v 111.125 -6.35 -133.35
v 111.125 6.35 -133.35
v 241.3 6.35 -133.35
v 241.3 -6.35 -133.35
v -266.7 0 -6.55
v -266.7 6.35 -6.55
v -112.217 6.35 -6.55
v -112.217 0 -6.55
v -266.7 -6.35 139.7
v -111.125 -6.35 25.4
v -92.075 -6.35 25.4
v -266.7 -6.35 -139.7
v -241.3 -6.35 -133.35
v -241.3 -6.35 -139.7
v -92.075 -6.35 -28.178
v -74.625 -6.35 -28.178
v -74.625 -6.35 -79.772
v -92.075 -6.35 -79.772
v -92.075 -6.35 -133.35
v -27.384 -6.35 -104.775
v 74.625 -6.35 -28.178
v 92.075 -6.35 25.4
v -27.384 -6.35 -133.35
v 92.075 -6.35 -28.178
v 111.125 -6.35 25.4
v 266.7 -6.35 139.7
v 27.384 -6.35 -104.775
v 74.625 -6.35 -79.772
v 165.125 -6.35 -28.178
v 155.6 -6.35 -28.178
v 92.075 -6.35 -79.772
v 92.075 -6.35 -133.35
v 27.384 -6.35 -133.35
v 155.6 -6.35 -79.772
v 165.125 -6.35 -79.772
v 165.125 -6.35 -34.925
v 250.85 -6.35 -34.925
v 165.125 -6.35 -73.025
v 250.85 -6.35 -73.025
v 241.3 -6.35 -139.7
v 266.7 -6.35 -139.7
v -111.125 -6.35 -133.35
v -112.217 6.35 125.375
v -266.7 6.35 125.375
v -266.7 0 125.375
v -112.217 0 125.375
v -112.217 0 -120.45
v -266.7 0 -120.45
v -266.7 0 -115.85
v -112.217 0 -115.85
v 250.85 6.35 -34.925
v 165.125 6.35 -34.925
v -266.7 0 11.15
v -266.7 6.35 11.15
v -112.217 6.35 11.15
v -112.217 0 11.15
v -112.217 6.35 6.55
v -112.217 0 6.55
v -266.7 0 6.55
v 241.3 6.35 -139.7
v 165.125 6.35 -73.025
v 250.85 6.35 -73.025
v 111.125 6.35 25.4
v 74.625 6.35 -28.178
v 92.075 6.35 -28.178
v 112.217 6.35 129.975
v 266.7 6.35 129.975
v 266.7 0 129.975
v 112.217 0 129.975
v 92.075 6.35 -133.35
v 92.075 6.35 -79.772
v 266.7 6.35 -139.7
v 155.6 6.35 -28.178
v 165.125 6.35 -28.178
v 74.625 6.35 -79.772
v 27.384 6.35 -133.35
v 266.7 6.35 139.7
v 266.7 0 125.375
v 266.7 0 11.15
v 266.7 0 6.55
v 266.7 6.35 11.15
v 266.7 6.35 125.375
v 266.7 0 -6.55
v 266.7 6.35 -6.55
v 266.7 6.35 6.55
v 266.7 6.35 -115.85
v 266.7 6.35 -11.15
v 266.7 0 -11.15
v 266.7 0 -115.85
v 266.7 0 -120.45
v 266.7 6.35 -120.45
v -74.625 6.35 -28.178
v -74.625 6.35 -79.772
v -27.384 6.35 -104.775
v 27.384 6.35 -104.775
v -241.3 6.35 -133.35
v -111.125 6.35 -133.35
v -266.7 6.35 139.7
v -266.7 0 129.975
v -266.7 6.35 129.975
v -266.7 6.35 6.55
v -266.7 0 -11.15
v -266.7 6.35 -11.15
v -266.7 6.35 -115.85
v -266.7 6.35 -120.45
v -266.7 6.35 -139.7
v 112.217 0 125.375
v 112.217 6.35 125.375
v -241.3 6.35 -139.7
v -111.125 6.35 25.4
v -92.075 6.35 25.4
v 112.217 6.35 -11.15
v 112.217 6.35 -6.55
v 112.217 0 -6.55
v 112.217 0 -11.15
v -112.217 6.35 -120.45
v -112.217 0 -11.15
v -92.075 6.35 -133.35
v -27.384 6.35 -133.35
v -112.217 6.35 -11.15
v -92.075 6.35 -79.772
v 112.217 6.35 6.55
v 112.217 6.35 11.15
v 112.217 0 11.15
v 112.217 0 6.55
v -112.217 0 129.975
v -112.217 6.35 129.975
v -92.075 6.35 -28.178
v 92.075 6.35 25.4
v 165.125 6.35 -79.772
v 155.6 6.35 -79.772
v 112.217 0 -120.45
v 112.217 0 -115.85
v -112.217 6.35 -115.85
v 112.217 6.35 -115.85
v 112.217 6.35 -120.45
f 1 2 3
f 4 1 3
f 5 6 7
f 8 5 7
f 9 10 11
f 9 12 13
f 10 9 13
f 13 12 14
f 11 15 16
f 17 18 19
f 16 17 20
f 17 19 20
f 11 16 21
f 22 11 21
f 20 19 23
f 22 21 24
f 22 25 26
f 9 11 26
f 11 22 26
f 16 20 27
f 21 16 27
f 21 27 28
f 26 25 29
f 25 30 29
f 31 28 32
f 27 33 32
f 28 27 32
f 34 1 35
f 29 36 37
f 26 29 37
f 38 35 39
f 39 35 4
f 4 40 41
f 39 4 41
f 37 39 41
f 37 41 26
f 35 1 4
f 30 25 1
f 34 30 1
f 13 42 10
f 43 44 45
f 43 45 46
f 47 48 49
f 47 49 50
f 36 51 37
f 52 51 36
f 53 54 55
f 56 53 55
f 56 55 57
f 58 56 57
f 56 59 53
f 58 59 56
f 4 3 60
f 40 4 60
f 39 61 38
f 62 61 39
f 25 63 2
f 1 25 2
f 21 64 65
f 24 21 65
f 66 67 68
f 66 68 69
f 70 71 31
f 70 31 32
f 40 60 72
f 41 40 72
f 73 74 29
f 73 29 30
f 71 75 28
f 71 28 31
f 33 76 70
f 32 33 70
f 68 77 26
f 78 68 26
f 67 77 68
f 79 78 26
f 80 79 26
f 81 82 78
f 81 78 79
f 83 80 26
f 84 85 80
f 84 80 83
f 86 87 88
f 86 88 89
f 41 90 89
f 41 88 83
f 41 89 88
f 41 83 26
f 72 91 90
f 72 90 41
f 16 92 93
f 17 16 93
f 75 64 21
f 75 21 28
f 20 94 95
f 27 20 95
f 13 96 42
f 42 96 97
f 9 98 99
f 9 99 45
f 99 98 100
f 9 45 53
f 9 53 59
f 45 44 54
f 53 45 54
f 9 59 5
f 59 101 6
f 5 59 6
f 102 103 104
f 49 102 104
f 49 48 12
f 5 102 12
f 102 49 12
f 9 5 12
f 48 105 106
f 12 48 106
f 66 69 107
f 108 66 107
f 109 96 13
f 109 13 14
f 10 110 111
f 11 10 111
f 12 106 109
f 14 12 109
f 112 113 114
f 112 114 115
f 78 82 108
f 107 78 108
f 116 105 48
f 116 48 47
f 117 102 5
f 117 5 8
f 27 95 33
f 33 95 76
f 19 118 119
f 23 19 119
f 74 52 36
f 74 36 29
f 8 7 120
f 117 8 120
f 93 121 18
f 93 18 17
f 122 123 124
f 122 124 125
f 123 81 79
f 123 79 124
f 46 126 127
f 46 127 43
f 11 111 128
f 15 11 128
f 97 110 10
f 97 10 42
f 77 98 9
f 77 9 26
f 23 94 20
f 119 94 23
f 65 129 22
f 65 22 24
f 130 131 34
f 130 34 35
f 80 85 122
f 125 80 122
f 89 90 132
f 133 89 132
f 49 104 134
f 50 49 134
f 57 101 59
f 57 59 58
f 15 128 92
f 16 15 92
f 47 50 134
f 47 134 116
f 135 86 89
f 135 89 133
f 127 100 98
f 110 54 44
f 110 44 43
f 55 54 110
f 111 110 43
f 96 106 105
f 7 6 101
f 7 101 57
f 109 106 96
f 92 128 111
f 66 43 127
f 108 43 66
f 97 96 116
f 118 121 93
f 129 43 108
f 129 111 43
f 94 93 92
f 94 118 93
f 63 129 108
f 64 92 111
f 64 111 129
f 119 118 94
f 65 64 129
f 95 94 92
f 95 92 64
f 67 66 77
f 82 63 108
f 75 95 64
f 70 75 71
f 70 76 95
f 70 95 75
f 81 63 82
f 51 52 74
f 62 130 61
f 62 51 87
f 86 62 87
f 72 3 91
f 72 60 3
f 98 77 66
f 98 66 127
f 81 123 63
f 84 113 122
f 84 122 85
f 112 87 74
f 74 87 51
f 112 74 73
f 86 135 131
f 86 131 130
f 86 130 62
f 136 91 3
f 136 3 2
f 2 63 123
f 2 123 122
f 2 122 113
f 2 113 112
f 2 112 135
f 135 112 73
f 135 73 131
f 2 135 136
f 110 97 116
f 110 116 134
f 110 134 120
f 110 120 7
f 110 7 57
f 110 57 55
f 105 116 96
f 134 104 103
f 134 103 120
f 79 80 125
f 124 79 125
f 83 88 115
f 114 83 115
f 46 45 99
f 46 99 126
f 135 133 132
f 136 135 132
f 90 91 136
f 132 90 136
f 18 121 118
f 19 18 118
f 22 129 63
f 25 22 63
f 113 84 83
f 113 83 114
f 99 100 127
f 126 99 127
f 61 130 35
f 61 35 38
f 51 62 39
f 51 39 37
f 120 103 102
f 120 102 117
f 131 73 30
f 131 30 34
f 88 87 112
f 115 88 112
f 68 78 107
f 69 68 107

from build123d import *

# Parameters (mm, degrees)
SKETCH1_W           = 533.4
SKETCH1_H           = 279.4
BOSS_EXTRUDE1_DEPTH = 6.35
SKETCH2_W           = 482.6
SKETCH2_H           = 6.35
CUT_EXTRUDE1_DEPTH  = 302.34078715
SKETCH3_W           = 19.05
SKETCH3_H           = 158.75
CUT_EXTRUDE2_DEPTH  = 302.34078715
SKETCH4_W           = 17.4498
SKETCH4_H           = 51.59375
CUT_EXTRUDE3_DEPTH  = 302.34078715
SKETCH5_W           = 54.76875
SKETCH5_H           = 28.575
CUT_EXTRUDE4_DEPTH  = 302.34078715
SKETCH6_W           = 154.4828
SKETCH6_H           = 4.6
CUT_EXTRUDE5_DEPTH  = 6.35


with BuildPart() as part:
    # Sketch1 → Boss-Extrude1 (new, symmetric)
    with BuildSketch(Plane(origin=(0, 0, 0), x_dir=(1, 0, 0), z_dir=(0, 1, 0))):
        Rectangle(SKETCH1_W, SKETCH1_H)
    extrude(amount=BOSS_EXTRUDE1_DEPTH, both=True)

    # Sketch2 → Cut-Extrude1 (cut, through all)
    with BuildSketch(Plane(origin=(0, 6.35, 0), x_dir=(1, 0, 0), z_dir=(0, 1, 0))):
        with Locations((0, 136.525)):
            Rectangle(SKETCH2_W, SKETCH2_H)
    extrude(amount=-CUT_EXTRUDE1_DEPTH, mode=Mode.SUBTRACT)

    # Sketch3 → Cut-Extrude2 (cut, through all)
    with BuildSketch(Plane(origin=(0, 6.35, 0), x_dir=(1, 0, 0), z_dir=(0, 1, 0))):
        with Locations((-101.6, 53.975)):
            Rectangle(SKETCH3_W, SKETCH3_H)
        with Locations((101.6, 53.975)):
            Rectangle(SKETCH3_W, SKETCH3_H)
    extrude(amount=-CUT_EXTRUDE2_DEPTH, mode=Mode.SUBTRACT)

    # Sketch4 → Cut-Extrude3 (cut, through all)
    with BuildSketch(Plane(origin=(0, 6.35, 0), x_dir=(1, 0, 0), z_dir=(0, 1, 0))):
        Polygon((165.1254, 73.025), (250.8504, 73.025), (250.8504, 34.925), (165.1254, 34.925), (165.1254, 28.178125), (155.6004, 28.178125), (155.6004, 79.771875), (165.1254, 79.771875), align=None)
        with Locations((-83.3501, 53.975)):
            Rectangle(SKETCH4_W, SKETCH4_H)
        with Locations((83.3501, 53.975)):
            Rectangle(SKETCH4_W, SKETCH4_H)
    extrude(amount=-CUT_EXTRUDE3_DEPTH, mode=Mode.SUBTRACT)

    # Sketch5 → Cut-Extrude4 (cut, through all)
    with BuildSketch(Plane(origin=(0, 6.35, 0), x_dir=(1, 0, 0), z_dir=(0, 1, 0))):
        with Locations((0, 119.0625)):
            Rectangle(SKETCH5_W, SKETCH5_H)
    extrude(amount=-CUT_EXTRUDE4_DEPTH, mode=Mode.SUBTRACT)

    # Sketch6 → Cut-Extrude5 (cut)
    with BuildSketch(Plane(origin=(0, 6.35, 0), x_dir=(1, 0, 0), z_dir=(0, 1, 0))):
        with Locations((-189.4586, -127.675)):
            Rectangle(SKETCH6_W, SKETCH6_H)
        with Locations((-189.4586, 8.85)):
            Rectangle(SKETCH6_W, SKETCH6_H)
        with Locations((-189.4586, 118.15)):
            Rectangle(SKETCH6_W, SKETCH6_H)
        with Locations((-189.4586, -8.85)):
            Rectangle(SKETCH6_W, SKETCH6_H)
    cut_extrude5 = extrude(amount=-CUT_EXTRUDE5_DEPTH, mode=Mode.SUBTRACT)

    # Mirror1: Cut-Extrude5 across plane
    add(cut_extrude5.mirror(Plane(origin=(0, 0, 0), x_dir=(0, 0, 1), z_dir=(1, 0, 0))), mode=Mode.SUBTRACT)


solid = part.part
